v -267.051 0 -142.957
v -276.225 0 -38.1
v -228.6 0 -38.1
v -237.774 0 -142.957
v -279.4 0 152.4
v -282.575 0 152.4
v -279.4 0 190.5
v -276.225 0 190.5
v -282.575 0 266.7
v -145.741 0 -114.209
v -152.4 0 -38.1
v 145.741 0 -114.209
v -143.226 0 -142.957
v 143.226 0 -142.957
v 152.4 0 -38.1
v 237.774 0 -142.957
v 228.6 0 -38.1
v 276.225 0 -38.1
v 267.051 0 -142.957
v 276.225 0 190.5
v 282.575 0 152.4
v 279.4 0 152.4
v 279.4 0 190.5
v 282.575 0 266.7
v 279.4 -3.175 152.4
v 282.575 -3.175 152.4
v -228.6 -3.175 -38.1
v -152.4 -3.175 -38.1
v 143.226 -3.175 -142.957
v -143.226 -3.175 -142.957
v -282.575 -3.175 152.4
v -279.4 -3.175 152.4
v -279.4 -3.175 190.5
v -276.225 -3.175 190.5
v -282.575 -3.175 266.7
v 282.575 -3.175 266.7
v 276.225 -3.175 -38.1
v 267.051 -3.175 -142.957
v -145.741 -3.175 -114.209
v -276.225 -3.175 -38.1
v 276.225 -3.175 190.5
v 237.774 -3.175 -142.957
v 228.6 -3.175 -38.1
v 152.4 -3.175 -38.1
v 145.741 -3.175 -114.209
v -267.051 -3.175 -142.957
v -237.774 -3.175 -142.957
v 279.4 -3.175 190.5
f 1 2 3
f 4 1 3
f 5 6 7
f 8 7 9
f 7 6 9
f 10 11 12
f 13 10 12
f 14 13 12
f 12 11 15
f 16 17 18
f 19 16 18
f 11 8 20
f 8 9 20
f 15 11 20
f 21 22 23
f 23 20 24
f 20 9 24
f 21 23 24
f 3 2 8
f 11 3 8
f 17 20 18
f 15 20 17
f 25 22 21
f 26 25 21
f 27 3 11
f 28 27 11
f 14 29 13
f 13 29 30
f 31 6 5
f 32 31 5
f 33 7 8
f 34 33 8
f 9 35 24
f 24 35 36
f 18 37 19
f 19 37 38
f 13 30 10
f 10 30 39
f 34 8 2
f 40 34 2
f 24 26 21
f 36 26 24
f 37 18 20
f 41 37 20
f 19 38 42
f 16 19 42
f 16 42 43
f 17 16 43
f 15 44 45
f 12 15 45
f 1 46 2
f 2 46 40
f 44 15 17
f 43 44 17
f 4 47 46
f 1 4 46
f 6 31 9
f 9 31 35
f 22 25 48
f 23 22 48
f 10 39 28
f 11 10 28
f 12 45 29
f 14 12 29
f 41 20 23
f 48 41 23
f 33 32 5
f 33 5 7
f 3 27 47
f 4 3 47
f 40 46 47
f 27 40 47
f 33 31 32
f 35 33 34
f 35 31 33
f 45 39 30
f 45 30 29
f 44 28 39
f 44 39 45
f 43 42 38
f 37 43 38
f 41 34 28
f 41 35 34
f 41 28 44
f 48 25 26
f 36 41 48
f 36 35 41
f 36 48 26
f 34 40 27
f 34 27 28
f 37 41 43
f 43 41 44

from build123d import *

# Parameters (mm, degrees)
F1_DEPTH = 3.175
F2_W     = 3.175
F2_H     = 114.3
F3_DEPTH = 3.175
F4_W     = 76.2
F4_H     = 161.842626
F5_DEPTH = 3.176


with BuildPart() as f1:
    # F0 (on Front) → F1 (new body)
    with BuildSketch(Plane.XZ):
        Polygon((228.6, -304.8), (276.225, -304.8), (276.225, 190.5), (279.4, 190.5), (279.4, 266.7), (276.225, 266.7), (-276.225, 266.7), (-279.4, 266.7), (-279.4, 190.5), (-276.225, 190.5), (-276.225, 185.04481), (-276.225, -304.8), (-228.6, -304.8), (-228.6, -38.1), (-152.4, -38.1), (-152.4, -304.8), (152.4, -304.8), (152.4, -38.1), (228.6, -38.1), align=None)
    extrude(amount=F1_DEPTH)

    # F2 (on face) → F3 (join, through all)
    with BuildSketch(Plane.XZ.offset(3.175)):
        with Locations((280.9875, 209.55)):
            Rectangle(F2_W, F2_H)
        with Locations((-280.9875, 209.55)):
            Rectangle(F2_W, F2_H)
    extrude(amount=-F3_DEPTH)

    # F4 (on face) → F5 (cut, through all)
    with BuildSketch(Plane.XZ.offset(3.175)):
        Polygon((-228.6, -142.957374), (-228.6, -38.1), (-237.773832, -142.957374), (-267.051168, -142.957374), (-276.225, -38.1), (-276.225, -142.957374), (-276.225, -304.8), (-252.891773, -304.8), (-251.933227, -304.8), (-228.6, -304.8), align=None)
        with Locations((-190.5, -223.878687)):
            Rectangle(F4_W, F4_H)
        Polygon((-152.4, -38.1), (-152.4, -142.957374), (-152.4, -304.8), (152.4, -304.8), (152.4, -142.957374), (152.4, -38.1), (145.741312, -114.209149), (143.226168, -142.957374), (-143.226168, -142.957374), (-145.741312, -114.209149), align=None)
        with Locations((190.5, -223.878687)):
            Rectangle(F4_W, F4_H)
        Polygon((228.6, -142.957374), (228.6, -304.8), (251.933227, -304.8), (252.891773, -304.8), (276.225, -304.8), (276.225, -142.957374), (276.225, -38.1), (267.051168, -142.957374), (237.773832, -142.957374), (228.6, -38.1), align=None)
    extrude(amount=-F5_DEPTH, mode=Mode.SUBTRACT)


solid = f1.part
